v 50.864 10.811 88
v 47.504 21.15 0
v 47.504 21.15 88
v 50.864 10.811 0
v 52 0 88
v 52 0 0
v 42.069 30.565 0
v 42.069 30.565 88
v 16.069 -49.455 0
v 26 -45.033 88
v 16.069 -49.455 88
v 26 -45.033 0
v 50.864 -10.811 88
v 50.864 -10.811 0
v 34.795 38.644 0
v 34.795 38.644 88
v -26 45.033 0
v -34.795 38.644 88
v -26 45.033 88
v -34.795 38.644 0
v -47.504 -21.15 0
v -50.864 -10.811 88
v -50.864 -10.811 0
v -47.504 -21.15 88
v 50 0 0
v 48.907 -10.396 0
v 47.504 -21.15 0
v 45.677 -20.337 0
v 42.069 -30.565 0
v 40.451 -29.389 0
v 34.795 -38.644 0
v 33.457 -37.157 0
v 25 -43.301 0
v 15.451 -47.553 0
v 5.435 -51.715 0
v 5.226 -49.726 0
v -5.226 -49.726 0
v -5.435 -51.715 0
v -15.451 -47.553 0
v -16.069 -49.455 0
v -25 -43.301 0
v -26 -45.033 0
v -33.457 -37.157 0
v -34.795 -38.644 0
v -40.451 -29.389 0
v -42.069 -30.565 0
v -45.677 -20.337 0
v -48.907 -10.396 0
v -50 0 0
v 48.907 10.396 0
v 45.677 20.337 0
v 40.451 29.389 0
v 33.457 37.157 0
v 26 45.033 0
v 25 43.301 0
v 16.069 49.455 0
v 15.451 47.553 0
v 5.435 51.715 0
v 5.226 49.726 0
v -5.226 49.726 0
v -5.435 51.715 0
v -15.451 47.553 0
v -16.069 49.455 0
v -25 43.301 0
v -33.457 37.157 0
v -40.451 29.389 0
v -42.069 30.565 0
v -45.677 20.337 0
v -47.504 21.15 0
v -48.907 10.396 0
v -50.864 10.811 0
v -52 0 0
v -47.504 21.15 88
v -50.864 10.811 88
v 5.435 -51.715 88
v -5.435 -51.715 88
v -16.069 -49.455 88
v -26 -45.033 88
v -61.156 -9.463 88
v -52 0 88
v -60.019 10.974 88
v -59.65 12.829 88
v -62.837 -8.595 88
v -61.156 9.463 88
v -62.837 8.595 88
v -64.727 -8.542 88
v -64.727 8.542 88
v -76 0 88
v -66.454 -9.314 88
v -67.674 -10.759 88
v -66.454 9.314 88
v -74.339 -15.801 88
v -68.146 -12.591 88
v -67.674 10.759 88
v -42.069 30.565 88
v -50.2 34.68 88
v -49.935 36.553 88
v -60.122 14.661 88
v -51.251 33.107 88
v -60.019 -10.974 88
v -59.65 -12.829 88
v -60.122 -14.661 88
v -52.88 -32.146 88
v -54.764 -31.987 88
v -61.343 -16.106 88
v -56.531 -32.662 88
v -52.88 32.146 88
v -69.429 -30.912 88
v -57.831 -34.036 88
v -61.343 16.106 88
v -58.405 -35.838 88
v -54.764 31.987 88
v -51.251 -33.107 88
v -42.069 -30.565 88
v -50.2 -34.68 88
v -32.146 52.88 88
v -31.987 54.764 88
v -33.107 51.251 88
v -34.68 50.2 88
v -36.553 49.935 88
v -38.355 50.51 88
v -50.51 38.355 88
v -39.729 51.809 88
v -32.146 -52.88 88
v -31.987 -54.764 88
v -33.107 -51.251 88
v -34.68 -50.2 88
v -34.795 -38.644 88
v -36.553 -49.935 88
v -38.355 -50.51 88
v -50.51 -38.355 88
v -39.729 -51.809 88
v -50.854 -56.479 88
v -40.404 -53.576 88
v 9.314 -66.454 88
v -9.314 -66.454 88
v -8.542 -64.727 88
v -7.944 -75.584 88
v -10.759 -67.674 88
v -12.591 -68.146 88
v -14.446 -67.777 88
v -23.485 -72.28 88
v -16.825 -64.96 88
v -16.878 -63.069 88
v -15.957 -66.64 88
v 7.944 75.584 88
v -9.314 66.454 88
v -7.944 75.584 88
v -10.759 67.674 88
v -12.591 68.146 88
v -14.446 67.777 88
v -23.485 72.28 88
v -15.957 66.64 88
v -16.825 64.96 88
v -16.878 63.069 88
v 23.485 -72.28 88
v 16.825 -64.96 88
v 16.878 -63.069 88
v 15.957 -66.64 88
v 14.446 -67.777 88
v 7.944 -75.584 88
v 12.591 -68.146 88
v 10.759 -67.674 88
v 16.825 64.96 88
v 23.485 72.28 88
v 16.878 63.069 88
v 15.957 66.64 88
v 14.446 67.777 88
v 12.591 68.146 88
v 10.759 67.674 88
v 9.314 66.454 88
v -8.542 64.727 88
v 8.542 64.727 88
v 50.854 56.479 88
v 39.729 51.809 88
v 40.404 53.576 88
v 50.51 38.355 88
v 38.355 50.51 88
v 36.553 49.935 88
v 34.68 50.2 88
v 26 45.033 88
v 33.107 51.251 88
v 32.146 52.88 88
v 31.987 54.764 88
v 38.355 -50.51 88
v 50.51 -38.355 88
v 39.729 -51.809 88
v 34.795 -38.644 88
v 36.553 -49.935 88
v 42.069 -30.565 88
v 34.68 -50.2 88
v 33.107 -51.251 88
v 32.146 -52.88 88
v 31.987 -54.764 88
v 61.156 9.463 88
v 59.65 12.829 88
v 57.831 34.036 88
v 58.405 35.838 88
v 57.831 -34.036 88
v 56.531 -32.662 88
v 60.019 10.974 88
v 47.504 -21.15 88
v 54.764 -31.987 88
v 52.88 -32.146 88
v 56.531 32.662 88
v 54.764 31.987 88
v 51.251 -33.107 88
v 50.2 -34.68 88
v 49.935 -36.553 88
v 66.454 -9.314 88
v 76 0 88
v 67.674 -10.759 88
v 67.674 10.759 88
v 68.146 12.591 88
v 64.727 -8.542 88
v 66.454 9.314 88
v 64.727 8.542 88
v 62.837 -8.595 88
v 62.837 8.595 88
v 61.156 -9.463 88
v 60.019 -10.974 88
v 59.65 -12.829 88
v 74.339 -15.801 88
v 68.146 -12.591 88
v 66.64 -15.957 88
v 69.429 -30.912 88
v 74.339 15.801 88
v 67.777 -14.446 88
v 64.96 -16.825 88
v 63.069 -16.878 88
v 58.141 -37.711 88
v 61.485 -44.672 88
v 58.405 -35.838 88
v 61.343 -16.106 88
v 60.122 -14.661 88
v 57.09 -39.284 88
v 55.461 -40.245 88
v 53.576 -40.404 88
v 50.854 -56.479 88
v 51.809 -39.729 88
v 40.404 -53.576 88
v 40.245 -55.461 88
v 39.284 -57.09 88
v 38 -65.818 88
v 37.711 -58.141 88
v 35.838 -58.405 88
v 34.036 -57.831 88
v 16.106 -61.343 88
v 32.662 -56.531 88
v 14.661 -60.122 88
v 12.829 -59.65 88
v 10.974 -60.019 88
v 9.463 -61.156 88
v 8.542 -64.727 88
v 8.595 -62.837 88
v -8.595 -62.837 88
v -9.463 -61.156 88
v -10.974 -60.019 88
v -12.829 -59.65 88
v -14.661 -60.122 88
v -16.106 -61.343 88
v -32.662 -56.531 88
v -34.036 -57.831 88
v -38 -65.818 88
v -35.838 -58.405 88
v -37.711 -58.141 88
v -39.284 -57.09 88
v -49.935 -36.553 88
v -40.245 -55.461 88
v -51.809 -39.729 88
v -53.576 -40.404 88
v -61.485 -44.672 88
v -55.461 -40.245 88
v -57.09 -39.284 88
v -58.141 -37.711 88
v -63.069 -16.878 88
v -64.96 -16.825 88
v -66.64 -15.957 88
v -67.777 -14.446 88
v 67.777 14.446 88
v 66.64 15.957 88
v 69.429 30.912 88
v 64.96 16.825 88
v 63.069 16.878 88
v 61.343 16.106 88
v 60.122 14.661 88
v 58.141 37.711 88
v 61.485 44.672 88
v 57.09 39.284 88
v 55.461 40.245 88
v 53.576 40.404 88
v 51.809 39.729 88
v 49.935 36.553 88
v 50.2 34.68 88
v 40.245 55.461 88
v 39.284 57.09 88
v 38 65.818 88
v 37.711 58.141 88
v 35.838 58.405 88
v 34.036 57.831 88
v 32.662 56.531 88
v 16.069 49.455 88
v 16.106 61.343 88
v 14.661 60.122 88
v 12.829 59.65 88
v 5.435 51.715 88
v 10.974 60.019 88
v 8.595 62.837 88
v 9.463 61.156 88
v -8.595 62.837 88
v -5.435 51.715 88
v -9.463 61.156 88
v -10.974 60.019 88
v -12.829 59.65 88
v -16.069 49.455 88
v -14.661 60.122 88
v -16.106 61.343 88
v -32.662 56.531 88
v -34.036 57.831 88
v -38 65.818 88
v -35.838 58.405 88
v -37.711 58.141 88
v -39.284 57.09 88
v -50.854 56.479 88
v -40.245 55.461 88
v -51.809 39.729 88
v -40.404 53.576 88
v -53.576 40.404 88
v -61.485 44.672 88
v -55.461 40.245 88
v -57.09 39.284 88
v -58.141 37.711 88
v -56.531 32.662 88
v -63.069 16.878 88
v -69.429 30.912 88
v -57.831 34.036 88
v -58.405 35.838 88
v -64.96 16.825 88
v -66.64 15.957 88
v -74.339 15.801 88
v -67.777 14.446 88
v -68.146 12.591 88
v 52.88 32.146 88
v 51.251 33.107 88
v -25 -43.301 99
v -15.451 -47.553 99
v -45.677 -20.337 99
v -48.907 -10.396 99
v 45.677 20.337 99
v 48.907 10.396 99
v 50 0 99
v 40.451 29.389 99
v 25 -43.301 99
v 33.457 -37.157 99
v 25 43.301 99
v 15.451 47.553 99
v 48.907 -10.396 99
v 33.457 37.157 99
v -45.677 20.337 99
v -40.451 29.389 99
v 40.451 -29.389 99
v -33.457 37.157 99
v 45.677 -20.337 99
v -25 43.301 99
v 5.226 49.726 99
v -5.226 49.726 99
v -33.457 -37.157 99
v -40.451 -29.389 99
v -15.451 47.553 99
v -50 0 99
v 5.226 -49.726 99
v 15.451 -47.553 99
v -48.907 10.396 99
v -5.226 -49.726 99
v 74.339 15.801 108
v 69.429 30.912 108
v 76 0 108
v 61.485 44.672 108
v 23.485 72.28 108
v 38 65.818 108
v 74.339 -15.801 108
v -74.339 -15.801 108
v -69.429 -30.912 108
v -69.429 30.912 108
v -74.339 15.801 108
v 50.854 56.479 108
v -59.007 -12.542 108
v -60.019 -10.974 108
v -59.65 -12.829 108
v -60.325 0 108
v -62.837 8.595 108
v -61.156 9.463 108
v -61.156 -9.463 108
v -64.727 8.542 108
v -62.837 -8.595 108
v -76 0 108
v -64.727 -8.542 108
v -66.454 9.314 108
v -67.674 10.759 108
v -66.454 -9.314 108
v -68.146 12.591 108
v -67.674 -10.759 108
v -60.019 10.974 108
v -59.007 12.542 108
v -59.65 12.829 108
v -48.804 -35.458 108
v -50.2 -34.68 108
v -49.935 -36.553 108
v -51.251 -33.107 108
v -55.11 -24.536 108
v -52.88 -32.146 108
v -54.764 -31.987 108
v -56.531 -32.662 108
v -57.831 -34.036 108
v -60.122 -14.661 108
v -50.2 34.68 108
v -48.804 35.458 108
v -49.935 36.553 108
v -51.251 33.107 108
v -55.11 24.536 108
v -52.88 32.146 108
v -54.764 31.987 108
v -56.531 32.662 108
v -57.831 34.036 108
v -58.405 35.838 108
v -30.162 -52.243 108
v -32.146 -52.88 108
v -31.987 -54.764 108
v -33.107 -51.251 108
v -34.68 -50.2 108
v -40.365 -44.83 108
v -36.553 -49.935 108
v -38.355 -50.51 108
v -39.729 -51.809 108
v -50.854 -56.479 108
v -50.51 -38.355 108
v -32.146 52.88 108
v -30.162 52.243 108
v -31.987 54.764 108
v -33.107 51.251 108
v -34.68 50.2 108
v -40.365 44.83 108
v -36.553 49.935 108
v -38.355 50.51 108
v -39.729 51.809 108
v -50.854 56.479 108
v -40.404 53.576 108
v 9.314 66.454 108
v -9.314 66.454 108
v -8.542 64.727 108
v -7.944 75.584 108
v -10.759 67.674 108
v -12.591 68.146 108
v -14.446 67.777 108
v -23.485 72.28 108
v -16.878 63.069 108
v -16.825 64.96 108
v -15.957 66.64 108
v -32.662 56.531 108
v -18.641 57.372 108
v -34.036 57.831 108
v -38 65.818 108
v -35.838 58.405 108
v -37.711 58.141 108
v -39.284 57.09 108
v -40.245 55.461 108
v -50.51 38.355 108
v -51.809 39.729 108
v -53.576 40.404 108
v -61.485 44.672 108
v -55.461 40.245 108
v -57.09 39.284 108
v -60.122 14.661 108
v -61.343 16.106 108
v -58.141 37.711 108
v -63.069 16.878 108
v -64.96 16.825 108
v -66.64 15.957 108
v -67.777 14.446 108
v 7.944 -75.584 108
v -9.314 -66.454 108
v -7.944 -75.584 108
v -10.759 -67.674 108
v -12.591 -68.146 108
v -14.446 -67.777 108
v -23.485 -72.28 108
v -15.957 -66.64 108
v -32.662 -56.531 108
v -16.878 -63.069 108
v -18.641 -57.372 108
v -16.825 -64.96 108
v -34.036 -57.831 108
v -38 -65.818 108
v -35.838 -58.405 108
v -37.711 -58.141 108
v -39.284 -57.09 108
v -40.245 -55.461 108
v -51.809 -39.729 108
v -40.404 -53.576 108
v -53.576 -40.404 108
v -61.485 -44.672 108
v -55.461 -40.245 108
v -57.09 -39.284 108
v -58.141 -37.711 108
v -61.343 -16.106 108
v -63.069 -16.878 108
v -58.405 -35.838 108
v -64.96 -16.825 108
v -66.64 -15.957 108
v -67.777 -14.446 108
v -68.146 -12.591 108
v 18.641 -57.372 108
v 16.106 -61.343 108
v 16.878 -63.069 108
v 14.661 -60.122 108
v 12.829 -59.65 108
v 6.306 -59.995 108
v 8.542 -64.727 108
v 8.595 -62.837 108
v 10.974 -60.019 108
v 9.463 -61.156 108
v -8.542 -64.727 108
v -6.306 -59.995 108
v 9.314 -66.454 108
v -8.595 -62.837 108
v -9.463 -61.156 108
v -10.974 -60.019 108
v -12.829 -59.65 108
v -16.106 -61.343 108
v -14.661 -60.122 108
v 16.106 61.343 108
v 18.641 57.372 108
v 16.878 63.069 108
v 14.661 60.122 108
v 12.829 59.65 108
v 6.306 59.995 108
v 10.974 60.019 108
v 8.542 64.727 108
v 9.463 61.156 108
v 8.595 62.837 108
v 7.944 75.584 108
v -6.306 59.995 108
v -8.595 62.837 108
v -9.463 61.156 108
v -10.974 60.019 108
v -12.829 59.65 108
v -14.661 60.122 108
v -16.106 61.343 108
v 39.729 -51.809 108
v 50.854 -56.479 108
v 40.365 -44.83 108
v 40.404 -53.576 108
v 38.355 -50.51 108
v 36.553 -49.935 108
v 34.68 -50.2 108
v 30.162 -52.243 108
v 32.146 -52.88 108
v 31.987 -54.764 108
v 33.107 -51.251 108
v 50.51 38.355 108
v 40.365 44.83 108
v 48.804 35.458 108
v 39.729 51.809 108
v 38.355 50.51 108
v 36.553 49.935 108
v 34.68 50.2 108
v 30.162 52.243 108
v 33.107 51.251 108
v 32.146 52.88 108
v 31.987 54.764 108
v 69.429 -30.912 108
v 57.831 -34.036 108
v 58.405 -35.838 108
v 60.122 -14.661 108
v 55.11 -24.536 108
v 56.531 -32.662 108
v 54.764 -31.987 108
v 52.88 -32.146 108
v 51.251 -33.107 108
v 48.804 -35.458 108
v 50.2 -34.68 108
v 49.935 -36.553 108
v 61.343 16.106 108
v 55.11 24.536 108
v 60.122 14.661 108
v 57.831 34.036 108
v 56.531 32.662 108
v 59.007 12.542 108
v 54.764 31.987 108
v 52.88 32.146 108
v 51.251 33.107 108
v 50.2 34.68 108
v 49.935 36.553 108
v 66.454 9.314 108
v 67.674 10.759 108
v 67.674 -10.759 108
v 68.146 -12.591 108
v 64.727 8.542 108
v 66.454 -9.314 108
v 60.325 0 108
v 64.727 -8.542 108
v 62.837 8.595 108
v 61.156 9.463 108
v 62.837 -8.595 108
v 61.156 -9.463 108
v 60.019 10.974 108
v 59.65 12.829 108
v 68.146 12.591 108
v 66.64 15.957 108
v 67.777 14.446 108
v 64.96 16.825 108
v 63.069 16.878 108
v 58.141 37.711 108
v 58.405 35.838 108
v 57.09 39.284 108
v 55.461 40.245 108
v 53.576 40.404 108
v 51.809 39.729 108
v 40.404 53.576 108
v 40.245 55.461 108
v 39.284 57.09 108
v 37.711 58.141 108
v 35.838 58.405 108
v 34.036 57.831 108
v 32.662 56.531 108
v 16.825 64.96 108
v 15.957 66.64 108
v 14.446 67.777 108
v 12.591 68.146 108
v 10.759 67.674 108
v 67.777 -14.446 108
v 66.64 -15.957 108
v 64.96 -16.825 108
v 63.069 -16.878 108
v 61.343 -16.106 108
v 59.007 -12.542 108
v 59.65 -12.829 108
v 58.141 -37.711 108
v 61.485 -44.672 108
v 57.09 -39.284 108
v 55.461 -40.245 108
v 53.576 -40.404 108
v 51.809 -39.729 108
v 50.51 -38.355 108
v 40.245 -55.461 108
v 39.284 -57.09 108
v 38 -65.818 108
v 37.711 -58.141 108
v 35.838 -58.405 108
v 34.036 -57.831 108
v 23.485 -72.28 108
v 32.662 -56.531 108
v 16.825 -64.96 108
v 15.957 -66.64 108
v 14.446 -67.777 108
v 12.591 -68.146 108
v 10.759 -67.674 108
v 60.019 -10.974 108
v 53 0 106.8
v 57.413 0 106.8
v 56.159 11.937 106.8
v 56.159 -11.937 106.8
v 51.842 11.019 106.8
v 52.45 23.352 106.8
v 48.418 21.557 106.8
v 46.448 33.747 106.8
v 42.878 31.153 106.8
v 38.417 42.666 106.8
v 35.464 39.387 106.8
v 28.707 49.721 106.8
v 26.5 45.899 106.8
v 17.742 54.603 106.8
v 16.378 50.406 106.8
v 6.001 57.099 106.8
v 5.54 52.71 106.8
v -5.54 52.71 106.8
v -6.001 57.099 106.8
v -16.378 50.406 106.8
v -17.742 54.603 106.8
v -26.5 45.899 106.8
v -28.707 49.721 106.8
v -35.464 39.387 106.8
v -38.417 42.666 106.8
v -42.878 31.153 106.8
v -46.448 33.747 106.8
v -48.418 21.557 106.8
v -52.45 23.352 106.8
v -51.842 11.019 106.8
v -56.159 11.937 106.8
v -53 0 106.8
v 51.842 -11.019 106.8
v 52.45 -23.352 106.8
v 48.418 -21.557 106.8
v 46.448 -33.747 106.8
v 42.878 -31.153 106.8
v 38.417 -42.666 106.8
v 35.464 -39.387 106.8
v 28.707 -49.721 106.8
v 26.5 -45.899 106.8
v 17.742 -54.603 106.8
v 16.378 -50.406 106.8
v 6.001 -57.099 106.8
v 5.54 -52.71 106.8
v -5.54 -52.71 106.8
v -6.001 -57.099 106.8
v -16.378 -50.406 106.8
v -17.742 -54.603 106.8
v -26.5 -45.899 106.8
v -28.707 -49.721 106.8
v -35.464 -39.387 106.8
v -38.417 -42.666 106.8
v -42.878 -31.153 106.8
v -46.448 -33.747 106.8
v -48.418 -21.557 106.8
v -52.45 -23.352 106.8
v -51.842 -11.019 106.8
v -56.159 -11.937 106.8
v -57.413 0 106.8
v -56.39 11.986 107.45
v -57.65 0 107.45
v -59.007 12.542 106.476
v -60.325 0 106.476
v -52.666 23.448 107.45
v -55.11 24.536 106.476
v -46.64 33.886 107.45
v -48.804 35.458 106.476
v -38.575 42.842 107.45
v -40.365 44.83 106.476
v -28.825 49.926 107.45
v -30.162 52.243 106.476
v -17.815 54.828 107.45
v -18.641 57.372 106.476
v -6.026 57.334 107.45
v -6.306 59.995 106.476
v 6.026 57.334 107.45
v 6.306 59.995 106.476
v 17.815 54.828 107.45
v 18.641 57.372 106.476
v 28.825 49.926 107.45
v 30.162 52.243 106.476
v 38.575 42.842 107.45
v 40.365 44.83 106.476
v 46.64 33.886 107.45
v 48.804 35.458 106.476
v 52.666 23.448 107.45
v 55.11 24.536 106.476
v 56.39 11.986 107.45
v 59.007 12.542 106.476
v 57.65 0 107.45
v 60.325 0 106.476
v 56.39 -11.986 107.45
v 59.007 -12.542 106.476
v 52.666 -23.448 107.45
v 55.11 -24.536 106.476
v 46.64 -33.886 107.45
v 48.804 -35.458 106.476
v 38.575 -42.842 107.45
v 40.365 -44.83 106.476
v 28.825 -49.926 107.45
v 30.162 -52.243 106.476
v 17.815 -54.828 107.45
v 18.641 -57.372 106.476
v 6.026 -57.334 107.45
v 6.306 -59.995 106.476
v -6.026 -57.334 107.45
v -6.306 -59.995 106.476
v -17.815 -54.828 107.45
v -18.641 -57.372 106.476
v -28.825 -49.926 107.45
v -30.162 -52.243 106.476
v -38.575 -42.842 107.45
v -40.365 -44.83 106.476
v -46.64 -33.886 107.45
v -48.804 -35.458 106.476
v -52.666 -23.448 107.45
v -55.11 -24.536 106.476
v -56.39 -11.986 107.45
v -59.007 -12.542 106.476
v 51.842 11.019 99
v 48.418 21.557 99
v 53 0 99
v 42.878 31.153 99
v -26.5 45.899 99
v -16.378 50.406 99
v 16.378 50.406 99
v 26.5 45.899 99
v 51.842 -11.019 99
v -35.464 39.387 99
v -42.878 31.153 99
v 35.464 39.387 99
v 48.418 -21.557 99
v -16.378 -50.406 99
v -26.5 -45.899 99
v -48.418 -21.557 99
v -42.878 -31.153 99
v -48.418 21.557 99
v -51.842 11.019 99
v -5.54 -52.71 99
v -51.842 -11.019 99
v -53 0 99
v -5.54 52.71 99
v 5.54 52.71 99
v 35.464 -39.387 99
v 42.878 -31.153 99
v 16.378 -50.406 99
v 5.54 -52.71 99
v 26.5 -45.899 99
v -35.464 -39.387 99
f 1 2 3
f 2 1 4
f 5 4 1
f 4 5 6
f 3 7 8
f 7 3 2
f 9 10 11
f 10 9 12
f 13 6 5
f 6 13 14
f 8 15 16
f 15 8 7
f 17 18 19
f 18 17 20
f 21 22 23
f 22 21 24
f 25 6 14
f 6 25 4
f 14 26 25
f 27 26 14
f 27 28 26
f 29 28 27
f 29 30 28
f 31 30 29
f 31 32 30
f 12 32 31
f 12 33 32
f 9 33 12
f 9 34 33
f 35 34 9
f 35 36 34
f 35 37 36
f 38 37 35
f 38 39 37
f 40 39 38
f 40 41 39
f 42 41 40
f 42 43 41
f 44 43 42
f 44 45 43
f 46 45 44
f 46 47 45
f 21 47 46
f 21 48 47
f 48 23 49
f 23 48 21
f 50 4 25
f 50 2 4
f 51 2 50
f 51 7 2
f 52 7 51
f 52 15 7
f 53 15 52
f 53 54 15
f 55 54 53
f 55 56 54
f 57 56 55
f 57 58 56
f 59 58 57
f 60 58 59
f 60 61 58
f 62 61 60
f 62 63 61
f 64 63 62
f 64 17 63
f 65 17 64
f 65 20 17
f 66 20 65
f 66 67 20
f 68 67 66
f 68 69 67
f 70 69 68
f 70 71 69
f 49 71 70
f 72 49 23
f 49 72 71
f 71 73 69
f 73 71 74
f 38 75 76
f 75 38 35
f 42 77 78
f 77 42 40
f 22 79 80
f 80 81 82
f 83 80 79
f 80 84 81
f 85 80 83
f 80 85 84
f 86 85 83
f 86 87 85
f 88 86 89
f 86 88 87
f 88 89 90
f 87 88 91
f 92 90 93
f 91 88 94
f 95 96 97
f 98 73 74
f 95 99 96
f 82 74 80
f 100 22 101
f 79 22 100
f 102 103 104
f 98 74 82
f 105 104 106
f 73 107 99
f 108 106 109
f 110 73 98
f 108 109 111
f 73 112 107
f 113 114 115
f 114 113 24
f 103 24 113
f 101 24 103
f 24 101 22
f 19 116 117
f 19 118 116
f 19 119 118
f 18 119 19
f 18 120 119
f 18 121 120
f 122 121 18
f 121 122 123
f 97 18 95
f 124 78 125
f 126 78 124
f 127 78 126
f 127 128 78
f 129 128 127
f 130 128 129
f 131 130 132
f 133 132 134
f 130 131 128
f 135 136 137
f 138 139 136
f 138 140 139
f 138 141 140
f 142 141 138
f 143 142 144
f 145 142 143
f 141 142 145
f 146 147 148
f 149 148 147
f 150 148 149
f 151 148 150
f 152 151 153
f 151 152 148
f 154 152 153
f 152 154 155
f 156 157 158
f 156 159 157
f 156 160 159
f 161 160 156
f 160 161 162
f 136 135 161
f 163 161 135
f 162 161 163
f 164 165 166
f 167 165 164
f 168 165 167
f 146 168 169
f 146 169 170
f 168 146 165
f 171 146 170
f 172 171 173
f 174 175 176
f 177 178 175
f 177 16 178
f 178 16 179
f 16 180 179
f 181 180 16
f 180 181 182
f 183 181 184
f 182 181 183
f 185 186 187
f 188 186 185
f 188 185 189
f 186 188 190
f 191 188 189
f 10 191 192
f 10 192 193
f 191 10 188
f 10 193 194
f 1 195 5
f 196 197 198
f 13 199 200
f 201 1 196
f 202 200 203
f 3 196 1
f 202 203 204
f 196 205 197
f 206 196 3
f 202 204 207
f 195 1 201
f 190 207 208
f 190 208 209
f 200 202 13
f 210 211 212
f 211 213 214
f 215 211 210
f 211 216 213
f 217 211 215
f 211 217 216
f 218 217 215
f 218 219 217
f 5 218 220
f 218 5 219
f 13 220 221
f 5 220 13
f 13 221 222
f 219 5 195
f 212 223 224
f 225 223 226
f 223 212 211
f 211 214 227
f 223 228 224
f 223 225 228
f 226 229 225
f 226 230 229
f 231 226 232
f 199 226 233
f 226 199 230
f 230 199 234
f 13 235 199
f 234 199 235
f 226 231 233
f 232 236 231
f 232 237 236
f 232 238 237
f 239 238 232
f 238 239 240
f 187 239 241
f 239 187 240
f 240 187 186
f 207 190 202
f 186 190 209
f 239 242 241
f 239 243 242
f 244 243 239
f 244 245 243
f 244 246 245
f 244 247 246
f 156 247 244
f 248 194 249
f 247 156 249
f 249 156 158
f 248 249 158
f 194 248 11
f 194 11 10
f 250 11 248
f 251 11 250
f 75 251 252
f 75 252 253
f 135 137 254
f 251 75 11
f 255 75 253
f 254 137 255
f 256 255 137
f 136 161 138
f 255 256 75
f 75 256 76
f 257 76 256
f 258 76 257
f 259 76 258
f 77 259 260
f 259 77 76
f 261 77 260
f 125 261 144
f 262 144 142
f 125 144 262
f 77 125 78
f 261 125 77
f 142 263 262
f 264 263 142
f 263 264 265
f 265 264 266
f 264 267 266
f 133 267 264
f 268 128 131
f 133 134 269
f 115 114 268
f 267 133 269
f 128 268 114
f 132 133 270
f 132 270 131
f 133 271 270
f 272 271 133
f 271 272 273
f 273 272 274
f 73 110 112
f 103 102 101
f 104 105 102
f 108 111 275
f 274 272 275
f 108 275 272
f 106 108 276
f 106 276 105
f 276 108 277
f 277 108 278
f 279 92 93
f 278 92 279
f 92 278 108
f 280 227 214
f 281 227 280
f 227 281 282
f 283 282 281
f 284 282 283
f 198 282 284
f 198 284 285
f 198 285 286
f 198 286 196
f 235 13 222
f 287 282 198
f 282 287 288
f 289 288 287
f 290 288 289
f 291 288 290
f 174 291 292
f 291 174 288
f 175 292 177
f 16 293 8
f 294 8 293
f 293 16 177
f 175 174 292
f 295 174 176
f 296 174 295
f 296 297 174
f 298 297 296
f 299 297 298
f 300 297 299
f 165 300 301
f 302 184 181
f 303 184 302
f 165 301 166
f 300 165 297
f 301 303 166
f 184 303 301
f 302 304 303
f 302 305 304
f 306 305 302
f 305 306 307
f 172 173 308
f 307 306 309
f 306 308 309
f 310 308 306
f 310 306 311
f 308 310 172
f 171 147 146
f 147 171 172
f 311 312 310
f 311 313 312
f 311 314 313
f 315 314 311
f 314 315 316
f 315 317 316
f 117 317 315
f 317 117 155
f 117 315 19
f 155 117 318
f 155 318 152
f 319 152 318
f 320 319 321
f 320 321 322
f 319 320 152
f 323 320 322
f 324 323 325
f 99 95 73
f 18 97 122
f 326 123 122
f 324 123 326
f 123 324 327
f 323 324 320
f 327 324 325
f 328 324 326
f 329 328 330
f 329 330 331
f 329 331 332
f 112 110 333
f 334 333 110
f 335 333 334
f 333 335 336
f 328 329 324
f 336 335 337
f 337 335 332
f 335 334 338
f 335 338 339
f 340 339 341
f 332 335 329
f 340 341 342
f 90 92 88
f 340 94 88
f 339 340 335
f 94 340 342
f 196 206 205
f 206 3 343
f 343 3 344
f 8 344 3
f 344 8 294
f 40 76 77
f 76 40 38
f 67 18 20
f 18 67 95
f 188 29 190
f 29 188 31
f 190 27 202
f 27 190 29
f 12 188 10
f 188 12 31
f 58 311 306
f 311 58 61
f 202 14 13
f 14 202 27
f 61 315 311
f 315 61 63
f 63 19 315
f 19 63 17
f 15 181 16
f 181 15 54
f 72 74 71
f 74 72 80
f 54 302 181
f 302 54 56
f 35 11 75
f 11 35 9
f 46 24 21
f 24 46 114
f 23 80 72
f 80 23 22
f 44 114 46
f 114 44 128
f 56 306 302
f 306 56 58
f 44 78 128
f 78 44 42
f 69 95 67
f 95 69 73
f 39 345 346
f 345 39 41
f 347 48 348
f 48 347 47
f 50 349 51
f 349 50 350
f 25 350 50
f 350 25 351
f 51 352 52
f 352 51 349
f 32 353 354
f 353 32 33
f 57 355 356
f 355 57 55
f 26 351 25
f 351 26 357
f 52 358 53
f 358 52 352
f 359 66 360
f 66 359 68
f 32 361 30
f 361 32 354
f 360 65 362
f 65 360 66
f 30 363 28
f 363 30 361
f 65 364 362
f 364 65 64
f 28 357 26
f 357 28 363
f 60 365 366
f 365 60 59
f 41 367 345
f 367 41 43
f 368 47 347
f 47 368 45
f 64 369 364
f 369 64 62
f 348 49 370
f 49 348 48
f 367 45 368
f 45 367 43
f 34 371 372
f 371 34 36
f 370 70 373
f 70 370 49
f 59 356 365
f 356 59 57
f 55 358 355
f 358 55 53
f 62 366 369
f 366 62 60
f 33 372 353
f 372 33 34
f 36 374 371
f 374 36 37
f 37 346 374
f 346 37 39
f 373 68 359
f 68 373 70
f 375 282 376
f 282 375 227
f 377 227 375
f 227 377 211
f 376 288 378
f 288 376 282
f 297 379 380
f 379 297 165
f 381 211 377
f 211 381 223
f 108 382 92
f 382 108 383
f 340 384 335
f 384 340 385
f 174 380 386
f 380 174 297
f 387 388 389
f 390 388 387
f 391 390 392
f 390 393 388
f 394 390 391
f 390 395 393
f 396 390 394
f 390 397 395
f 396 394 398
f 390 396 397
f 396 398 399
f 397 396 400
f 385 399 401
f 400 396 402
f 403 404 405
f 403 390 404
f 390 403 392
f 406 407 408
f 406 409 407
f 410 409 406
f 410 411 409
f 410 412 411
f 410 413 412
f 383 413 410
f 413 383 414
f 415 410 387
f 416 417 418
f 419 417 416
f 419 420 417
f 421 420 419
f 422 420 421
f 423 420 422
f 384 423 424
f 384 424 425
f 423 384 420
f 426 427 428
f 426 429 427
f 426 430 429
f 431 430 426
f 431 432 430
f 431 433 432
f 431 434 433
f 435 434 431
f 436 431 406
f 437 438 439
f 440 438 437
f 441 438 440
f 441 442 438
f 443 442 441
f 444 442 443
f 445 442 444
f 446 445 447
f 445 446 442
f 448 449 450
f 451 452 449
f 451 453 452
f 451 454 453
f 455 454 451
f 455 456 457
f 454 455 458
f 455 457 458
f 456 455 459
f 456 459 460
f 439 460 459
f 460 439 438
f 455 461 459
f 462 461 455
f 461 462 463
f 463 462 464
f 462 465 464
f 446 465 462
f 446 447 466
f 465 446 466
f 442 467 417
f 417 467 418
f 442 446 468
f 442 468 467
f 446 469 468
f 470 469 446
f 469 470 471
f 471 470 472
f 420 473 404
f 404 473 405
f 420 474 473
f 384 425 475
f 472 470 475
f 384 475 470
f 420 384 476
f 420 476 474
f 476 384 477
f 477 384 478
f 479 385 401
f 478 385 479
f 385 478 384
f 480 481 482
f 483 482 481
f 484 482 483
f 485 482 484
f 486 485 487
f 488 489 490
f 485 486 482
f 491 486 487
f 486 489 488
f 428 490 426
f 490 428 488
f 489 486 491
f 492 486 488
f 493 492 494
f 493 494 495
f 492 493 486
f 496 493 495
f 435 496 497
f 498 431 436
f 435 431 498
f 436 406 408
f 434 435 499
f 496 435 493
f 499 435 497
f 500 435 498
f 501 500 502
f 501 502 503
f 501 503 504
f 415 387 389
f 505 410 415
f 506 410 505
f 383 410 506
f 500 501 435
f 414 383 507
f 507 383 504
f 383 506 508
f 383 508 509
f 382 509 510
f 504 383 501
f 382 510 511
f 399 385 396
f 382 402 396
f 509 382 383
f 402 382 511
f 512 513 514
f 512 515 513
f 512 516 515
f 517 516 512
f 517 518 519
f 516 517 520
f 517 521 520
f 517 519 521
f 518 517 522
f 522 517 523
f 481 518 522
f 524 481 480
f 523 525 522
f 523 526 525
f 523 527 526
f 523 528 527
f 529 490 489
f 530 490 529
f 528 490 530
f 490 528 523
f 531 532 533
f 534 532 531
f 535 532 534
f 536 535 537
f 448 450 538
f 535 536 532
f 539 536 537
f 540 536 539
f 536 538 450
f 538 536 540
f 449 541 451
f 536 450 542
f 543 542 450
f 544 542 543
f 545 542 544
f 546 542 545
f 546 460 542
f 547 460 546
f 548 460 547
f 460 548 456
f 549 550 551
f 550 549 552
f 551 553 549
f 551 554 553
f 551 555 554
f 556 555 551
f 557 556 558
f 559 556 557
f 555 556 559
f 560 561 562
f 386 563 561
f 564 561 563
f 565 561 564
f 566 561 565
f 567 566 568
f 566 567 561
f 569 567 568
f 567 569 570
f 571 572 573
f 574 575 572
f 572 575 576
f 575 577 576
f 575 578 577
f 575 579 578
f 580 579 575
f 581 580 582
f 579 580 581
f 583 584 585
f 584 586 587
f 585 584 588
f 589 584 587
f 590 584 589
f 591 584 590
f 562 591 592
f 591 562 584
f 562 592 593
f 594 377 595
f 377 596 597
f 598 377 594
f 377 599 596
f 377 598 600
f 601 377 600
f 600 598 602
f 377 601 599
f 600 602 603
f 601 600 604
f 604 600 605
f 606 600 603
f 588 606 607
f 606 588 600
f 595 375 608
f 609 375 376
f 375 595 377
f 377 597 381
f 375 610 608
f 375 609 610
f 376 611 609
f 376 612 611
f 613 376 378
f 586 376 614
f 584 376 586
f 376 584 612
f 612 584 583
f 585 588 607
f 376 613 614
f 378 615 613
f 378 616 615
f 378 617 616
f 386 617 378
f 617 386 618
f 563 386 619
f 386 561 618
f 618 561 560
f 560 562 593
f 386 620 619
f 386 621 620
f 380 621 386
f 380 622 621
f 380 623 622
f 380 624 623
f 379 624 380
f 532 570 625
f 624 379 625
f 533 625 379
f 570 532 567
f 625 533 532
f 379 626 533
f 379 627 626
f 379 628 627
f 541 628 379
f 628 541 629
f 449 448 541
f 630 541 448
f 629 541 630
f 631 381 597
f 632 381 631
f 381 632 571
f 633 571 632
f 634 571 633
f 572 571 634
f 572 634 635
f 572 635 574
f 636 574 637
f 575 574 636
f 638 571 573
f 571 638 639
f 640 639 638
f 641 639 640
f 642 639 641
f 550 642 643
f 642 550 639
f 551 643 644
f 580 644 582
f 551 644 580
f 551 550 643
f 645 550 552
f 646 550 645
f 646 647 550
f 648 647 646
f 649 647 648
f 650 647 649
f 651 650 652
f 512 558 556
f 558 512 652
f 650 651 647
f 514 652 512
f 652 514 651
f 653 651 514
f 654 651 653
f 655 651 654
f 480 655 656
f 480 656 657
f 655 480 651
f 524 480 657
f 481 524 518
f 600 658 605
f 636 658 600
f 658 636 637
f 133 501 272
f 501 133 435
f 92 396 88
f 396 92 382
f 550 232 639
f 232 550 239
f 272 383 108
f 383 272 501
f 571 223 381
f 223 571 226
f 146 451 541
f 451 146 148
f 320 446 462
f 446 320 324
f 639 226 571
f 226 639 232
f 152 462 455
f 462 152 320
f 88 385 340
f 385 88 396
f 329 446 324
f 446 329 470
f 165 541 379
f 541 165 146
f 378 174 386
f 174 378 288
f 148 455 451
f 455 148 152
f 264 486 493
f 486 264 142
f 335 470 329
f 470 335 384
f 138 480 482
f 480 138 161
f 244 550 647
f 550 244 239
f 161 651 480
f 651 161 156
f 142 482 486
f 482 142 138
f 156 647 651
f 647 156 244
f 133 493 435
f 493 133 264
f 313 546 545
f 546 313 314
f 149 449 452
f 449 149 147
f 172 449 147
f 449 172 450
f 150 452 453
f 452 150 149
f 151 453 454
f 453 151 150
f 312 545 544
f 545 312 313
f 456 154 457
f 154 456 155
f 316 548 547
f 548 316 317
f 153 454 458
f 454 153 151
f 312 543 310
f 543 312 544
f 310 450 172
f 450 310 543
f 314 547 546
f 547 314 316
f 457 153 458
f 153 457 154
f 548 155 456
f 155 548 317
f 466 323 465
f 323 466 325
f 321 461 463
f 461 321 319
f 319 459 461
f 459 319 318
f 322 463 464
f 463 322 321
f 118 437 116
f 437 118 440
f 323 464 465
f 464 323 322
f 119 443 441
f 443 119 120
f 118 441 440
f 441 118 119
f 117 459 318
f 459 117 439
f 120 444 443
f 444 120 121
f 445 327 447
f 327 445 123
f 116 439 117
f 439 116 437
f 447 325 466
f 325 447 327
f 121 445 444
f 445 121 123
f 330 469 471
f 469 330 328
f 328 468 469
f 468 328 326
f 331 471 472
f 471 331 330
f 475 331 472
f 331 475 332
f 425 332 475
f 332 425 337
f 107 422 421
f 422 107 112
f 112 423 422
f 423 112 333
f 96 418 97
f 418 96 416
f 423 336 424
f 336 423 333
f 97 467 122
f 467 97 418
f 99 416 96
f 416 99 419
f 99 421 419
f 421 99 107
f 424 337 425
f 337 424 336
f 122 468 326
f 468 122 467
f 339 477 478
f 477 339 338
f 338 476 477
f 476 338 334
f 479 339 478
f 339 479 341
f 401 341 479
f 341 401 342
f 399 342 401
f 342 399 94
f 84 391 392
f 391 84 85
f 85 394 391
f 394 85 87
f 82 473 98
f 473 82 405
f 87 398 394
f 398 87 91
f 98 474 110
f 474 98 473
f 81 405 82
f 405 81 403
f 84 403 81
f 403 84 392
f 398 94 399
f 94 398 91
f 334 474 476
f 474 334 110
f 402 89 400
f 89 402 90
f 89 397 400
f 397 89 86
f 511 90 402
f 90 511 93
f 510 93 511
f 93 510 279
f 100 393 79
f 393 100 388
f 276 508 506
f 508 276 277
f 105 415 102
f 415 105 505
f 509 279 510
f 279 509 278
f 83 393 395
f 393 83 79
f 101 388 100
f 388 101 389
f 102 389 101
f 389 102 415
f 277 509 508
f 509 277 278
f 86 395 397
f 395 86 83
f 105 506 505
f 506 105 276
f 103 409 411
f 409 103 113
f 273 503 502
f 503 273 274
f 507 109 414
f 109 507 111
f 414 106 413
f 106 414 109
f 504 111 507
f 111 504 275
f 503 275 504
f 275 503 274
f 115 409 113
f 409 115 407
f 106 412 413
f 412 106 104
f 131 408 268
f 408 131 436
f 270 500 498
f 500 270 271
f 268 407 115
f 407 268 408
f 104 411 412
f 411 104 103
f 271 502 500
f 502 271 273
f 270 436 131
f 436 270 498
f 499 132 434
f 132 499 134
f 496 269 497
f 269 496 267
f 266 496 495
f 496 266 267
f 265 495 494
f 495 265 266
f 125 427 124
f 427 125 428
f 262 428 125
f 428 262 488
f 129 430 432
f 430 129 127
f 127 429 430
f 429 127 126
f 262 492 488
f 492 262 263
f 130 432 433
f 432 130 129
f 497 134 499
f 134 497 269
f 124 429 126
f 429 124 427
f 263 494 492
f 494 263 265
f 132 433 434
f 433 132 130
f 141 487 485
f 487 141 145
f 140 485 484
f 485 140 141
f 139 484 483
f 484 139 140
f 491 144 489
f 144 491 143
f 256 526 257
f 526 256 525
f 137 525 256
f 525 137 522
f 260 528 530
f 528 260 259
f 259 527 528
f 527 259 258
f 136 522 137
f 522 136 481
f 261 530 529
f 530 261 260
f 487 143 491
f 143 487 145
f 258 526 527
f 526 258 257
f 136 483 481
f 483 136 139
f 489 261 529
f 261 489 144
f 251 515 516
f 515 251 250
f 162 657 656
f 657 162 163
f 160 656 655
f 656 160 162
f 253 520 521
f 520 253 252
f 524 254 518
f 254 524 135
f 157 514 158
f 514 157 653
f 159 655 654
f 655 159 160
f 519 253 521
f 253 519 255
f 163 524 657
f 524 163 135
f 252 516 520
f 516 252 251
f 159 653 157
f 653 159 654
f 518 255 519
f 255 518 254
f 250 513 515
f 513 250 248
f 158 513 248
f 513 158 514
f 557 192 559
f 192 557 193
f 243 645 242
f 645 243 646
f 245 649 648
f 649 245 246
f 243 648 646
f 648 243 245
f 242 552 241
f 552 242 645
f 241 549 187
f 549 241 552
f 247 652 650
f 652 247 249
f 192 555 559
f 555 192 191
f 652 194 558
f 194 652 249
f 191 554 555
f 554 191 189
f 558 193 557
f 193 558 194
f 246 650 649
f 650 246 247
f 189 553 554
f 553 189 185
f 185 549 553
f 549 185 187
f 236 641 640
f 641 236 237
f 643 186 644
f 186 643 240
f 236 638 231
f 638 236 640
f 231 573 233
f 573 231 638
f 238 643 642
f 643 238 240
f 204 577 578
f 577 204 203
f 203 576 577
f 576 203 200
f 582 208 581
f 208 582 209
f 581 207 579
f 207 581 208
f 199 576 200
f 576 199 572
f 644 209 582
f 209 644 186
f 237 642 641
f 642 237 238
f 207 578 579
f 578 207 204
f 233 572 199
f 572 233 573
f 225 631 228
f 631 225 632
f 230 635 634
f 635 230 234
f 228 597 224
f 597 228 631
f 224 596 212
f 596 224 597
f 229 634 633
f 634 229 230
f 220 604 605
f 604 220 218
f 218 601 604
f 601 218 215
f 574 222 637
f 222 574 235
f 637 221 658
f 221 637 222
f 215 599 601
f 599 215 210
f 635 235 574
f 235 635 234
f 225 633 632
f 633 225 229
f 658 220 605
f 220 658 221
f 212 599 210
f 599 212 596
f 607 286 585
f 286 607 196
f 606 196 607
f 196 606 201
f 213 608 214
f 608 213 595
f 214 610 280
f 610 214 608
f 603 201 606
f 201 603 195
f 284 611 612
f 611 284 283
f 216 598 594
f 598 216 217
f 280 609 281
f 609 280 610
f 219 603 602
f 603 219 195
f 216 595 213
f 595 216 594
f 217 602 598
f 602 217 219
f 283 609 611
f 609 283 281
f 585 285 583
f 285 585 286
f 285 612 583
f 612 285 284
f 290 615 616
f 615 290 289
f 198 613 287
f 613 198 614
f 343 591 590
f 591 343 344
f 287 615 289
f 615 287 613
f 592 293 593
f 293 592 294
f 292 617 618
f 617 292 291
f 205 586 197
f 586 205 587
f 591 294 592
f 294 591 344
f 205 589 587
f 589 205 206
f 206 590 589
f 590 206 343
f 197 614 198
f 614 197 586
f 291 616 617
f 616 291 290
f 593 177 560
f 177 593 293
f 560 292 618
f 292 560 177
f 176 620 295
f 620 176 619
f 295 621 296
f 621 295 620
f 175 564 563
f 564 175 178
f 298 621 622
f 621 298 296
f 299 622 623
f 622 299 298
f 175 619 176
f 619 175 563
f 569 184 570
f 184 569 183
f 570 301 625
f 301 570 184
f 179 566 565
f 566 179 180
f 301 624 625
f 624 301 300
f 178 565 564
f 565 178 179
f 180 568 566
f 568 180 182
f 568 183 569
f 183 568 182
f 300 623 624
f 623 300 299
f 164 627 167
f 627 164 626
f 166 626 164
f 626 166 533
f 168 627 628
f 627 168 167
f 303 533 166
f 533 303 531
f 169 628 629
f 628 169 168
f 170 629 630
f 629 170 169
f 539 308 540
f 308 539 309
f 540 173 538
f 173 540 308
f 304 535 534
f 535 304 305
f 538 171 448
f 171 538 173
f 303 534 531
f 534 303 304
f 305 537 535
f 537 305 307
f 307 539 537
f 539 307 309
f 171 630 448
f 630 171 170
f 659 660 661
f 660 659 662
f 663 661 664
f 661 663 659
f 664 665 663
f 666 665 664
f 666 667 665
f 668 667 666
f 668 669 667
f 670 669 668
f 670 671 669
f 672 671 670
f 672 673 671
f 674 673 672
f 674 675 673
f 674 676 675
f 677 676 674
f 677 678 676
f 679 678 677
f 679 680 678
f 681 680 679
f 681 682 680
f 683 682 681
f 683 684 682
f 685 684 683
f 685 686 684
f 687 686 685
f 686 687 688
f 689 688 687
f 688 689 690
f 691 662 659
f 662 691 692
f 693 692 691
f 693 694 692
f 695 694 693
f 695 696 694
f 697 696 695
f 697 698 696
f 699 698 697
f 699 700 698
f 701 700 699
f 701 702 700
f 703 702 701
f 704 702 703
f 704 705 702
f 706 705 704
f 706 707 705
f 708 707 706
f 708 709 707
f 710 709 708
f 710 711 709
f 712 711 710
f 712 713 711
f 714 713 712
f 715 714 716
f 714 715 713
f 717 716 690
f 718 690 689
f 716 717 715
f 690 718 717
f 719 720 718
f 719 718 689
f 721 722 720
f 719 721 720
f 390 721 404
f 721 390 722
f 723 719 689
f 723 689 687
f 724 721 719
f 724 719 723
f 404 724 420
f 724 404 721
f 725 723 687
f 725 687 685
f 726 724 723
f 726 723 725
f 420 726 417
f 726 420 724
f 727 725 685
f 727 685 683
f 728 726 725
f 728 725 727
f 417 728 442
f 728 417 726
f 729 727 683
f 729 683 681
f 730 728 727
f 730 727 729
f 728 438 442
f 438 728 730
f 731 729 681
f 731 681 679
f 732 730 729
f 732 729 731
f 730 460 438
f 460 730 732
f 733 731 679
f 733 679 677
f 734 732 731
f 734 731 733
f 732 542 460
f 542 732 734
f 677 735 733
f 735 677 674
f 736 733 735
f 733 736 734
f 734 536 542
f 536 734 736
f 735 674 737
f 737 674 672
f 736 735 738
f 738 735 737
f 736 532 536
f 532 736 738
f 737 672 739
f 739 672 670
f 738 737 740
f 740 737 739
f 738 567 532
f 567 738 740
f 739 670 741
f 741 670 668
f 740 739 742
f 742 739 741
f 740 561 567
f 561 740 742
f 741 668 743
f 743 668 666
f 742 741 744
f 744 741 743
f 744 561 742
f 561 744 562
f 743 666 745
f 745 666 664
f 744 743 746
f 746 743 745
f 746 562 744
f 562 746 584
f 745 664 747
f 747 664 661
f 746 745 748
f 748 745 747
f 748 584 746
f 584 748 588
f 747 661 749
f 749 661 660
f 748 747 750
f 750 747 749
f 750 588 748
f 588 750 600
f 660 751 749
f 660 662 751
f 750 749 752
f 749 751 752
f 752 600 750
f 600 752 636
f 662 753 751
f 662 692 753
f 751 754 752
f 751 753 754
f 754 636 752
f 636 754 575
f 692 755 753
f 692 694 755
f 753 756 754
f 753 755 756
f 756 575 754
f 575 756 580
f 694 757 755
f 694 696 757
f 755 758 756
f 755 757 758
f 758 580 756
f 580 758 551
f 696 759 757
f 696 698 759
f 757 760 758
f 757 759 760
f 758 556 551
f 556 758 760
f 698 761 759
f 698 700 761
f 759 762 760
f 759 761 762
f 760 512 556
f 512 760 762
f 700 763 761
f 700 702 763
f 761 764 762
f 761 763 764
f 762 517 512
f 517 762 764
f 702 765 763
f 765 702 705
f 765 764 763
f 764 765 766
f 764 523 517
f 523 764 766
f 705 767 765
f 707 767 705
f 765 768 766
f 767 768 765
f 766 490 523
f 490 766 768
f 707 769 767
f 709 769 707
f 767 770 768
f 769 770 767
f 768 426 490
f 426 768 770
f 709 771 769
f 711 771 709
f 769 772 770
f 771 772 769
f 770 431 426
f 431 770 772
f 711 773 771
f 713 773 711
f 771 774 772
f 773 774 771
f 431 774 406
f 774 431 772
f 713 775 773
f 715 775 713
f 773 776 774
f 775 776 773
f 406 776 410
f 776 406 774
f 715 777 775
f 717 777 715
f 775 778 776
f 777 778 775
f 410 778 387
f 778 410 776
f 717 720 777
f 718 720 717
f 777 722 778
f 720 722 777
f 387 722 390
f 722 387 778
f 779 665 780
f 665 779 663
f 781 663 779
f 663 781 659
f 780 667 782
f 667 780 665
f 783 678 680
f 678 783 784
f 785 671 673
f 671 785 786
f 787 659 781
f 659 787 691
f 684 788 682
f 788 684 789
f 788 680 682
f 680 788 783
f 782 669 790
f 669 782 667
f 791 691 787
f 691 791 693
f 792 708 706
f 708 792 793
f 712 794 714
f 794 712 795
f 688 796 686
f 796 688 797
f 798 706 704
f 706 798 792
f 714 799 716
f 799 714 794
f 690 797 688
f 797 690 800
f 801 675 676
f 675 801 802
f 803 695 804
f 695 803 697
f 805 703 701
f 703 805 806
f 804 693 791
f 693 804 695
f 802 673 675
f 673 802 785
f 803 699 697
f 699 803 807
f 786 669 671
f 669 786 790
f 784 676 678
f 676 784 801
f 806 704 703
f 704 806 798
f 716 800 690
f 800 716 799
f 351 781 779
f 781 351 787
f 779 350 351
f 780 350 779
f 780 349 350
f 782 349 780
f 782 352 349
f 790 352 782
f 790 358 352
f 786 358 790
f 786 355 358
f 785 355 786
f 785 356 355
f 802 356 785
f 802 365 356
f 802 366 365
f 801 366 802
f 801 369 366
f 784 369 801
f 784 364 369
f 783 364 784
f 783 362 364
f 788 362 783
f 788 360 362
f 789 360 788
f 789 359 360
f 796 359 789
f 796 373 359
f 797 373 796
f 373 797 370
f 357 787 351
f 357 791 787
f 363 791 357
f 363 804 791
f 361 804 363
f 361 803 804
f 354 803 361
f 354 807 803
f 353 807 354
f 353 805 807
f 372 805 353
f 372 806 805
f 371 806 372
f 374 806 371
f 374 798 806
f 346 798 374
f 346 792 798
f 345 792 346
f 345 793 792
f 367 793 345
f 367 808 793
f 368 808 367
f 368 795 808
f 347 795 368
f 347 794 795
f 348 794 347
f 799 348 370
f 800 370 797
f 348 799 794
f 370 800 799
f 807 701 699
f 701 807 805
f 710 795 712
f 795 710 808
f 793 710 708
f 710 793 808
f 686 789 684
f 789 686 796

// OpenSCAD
/*
CF vacuum flanges for OpenSCAD
This is free and unencumbered software released into the public domain.

Anyone is free to copy, modify, publish, use, compile, sell, or
distribute this software, either in source code form or as a compiled
binary, for any purpose, commercial or non-commercial, and by any
means.

In jurisdictions that recognize copyright laws, the author or authors
of this software dedicate any and all copyright interest in the
software to the public domain. We make this dedication for the benefit
of the public at large and to the detriment of our heirs and
successors. We intend this dedication to be an overt act of
relinquishment in perpetuity of all present and future rights to this
software under copyright law.

THE SOFTWARE IS PROVIDED "AS IS", WITHOUT WARRANTY OF ANY KIND,
EXPRESS OR IMPLIED, INCLUDING BUT NOT LIMITED TO THE WARRANTIES OF
MERCHANTABILITY, FITNESS FOR A PARTICULAR PURPOSE AND NONINFRINGEMENT.
IN NO EVENT SHALL THE AUTHORS BE LIABLE FOR ANY CLAIM, DAMAGES OR
OTHER LIABILITY, WHETHER IN AN ACTION OF CONTRACT, TORT OR OTHERWISE,
ARISING FROM, OUT OF OR IN CONNECTION WITH THE SOFTWARE OR THE USE OR
OTHER DEALINGS IN THE SOFTWARE.

For more information, please refer to <https://unlicense.org/>

Based on blueprints from https://www.tracepartsonline.net/(S(c314dufymcnxxurthiwo4pow))/PartDetails.aspx?PartFamilyID=30-03062015-098588&PartID=30-03062015-098588 , but should not be copyrightable
*/

module cylRing(d1, d2, h) {
	if (d2 > 0) {
		difference() {
			cylinder(h = h, d = d1);
			cylinder(h = h, d = d2);
		}
	} else {
		cylinder(h = h, d = d1);
	}
}

module createRidgeTorus(ridgeH = 0.65, ridgeAngle = 70, dRidge = 115.3, dRidgeEnd = 120.65, ridgeDepth = 1.2) {
	rRidge = dRidge / 2;
	rRidgeEnd = dRidgeEnd / 2;
	rotate_extrude()
		polygon(points = [
			[0, 0],
			[0, -ridgeDepth],
			[rRidge - ridgeH * tan(90 - ridgeAngle), -ridgeDepth],
			[rRidge,  - (ridgeDepth - ridgeH)],
			[rRidgeEnd,  - (ridgeDepth - ridgeH + (rRidgeEnd - rRidge) / tan(ridgeAngle))],
			[rRidgeEnd, 0]
		]);
}

module createHoles(holeDiamiter = 8.5, holeCount = 8 * 2, holeTrDiameter = 130.3, flangeSize = 20) {
	for (i = [0 : holeCount - 1]) {
		rotate((i + 1 / 2) * 360 / holeCount, [0, 0, 1])
			translate([0, holeTrDiameter / 2])
				cylinder(d = holeDiamiter, h = flangeSize);
	}
}

module CFBlankFlange(flangeDiameter = 152, holeDiameter = 0, flangeSize = 20, holeTrDiameter = 130.3) {
	group() {
		difference() {
			cylRing(d1 = flangeDiameter, d2 = holeDiameter, h = flangeSize);
			createHoles(flangeSize = flangeSize, holeTrDiameter = holeTrDiameter);
			translate([0, 0, flangeSize])
				createRidgeTorus();
		}
	}
}

module CFFlange(partLen = 108.0,
	innerDiameter = 100,
	outerDiameter = 104,
	flangeDiameter = 152,
	flangeSize = 20,
	grooveRadius = 1.5,
	openingDepth = 9,
	openingDiameter = 106,
	holeDiameter = 0,
	holeTrDiameter = 130.3) {

	middleSegmentSize = partLen - flangeSize;

	group() {
		difference() {
			difference() {
				union() {
					cylRing(h = middleSegmentSize, d1 = outerDiameter, d2 = innerDiameter);
					translate([0, 0, middleSegmentSize])
						CFBlankFlange(flangeDiameter = flangeDiameter, holeDiameter = innerDiameter, flangeSize = flangeSize, holeTrDiameter = holeTrDiameter);
				}

				translate([0, 0, partLen - openingDepth])
					cylinder(d = openingDiameter, h = openingDepth);
			}
		}
	}
}

CFFlange();  // this file is meant to be imported, not included
